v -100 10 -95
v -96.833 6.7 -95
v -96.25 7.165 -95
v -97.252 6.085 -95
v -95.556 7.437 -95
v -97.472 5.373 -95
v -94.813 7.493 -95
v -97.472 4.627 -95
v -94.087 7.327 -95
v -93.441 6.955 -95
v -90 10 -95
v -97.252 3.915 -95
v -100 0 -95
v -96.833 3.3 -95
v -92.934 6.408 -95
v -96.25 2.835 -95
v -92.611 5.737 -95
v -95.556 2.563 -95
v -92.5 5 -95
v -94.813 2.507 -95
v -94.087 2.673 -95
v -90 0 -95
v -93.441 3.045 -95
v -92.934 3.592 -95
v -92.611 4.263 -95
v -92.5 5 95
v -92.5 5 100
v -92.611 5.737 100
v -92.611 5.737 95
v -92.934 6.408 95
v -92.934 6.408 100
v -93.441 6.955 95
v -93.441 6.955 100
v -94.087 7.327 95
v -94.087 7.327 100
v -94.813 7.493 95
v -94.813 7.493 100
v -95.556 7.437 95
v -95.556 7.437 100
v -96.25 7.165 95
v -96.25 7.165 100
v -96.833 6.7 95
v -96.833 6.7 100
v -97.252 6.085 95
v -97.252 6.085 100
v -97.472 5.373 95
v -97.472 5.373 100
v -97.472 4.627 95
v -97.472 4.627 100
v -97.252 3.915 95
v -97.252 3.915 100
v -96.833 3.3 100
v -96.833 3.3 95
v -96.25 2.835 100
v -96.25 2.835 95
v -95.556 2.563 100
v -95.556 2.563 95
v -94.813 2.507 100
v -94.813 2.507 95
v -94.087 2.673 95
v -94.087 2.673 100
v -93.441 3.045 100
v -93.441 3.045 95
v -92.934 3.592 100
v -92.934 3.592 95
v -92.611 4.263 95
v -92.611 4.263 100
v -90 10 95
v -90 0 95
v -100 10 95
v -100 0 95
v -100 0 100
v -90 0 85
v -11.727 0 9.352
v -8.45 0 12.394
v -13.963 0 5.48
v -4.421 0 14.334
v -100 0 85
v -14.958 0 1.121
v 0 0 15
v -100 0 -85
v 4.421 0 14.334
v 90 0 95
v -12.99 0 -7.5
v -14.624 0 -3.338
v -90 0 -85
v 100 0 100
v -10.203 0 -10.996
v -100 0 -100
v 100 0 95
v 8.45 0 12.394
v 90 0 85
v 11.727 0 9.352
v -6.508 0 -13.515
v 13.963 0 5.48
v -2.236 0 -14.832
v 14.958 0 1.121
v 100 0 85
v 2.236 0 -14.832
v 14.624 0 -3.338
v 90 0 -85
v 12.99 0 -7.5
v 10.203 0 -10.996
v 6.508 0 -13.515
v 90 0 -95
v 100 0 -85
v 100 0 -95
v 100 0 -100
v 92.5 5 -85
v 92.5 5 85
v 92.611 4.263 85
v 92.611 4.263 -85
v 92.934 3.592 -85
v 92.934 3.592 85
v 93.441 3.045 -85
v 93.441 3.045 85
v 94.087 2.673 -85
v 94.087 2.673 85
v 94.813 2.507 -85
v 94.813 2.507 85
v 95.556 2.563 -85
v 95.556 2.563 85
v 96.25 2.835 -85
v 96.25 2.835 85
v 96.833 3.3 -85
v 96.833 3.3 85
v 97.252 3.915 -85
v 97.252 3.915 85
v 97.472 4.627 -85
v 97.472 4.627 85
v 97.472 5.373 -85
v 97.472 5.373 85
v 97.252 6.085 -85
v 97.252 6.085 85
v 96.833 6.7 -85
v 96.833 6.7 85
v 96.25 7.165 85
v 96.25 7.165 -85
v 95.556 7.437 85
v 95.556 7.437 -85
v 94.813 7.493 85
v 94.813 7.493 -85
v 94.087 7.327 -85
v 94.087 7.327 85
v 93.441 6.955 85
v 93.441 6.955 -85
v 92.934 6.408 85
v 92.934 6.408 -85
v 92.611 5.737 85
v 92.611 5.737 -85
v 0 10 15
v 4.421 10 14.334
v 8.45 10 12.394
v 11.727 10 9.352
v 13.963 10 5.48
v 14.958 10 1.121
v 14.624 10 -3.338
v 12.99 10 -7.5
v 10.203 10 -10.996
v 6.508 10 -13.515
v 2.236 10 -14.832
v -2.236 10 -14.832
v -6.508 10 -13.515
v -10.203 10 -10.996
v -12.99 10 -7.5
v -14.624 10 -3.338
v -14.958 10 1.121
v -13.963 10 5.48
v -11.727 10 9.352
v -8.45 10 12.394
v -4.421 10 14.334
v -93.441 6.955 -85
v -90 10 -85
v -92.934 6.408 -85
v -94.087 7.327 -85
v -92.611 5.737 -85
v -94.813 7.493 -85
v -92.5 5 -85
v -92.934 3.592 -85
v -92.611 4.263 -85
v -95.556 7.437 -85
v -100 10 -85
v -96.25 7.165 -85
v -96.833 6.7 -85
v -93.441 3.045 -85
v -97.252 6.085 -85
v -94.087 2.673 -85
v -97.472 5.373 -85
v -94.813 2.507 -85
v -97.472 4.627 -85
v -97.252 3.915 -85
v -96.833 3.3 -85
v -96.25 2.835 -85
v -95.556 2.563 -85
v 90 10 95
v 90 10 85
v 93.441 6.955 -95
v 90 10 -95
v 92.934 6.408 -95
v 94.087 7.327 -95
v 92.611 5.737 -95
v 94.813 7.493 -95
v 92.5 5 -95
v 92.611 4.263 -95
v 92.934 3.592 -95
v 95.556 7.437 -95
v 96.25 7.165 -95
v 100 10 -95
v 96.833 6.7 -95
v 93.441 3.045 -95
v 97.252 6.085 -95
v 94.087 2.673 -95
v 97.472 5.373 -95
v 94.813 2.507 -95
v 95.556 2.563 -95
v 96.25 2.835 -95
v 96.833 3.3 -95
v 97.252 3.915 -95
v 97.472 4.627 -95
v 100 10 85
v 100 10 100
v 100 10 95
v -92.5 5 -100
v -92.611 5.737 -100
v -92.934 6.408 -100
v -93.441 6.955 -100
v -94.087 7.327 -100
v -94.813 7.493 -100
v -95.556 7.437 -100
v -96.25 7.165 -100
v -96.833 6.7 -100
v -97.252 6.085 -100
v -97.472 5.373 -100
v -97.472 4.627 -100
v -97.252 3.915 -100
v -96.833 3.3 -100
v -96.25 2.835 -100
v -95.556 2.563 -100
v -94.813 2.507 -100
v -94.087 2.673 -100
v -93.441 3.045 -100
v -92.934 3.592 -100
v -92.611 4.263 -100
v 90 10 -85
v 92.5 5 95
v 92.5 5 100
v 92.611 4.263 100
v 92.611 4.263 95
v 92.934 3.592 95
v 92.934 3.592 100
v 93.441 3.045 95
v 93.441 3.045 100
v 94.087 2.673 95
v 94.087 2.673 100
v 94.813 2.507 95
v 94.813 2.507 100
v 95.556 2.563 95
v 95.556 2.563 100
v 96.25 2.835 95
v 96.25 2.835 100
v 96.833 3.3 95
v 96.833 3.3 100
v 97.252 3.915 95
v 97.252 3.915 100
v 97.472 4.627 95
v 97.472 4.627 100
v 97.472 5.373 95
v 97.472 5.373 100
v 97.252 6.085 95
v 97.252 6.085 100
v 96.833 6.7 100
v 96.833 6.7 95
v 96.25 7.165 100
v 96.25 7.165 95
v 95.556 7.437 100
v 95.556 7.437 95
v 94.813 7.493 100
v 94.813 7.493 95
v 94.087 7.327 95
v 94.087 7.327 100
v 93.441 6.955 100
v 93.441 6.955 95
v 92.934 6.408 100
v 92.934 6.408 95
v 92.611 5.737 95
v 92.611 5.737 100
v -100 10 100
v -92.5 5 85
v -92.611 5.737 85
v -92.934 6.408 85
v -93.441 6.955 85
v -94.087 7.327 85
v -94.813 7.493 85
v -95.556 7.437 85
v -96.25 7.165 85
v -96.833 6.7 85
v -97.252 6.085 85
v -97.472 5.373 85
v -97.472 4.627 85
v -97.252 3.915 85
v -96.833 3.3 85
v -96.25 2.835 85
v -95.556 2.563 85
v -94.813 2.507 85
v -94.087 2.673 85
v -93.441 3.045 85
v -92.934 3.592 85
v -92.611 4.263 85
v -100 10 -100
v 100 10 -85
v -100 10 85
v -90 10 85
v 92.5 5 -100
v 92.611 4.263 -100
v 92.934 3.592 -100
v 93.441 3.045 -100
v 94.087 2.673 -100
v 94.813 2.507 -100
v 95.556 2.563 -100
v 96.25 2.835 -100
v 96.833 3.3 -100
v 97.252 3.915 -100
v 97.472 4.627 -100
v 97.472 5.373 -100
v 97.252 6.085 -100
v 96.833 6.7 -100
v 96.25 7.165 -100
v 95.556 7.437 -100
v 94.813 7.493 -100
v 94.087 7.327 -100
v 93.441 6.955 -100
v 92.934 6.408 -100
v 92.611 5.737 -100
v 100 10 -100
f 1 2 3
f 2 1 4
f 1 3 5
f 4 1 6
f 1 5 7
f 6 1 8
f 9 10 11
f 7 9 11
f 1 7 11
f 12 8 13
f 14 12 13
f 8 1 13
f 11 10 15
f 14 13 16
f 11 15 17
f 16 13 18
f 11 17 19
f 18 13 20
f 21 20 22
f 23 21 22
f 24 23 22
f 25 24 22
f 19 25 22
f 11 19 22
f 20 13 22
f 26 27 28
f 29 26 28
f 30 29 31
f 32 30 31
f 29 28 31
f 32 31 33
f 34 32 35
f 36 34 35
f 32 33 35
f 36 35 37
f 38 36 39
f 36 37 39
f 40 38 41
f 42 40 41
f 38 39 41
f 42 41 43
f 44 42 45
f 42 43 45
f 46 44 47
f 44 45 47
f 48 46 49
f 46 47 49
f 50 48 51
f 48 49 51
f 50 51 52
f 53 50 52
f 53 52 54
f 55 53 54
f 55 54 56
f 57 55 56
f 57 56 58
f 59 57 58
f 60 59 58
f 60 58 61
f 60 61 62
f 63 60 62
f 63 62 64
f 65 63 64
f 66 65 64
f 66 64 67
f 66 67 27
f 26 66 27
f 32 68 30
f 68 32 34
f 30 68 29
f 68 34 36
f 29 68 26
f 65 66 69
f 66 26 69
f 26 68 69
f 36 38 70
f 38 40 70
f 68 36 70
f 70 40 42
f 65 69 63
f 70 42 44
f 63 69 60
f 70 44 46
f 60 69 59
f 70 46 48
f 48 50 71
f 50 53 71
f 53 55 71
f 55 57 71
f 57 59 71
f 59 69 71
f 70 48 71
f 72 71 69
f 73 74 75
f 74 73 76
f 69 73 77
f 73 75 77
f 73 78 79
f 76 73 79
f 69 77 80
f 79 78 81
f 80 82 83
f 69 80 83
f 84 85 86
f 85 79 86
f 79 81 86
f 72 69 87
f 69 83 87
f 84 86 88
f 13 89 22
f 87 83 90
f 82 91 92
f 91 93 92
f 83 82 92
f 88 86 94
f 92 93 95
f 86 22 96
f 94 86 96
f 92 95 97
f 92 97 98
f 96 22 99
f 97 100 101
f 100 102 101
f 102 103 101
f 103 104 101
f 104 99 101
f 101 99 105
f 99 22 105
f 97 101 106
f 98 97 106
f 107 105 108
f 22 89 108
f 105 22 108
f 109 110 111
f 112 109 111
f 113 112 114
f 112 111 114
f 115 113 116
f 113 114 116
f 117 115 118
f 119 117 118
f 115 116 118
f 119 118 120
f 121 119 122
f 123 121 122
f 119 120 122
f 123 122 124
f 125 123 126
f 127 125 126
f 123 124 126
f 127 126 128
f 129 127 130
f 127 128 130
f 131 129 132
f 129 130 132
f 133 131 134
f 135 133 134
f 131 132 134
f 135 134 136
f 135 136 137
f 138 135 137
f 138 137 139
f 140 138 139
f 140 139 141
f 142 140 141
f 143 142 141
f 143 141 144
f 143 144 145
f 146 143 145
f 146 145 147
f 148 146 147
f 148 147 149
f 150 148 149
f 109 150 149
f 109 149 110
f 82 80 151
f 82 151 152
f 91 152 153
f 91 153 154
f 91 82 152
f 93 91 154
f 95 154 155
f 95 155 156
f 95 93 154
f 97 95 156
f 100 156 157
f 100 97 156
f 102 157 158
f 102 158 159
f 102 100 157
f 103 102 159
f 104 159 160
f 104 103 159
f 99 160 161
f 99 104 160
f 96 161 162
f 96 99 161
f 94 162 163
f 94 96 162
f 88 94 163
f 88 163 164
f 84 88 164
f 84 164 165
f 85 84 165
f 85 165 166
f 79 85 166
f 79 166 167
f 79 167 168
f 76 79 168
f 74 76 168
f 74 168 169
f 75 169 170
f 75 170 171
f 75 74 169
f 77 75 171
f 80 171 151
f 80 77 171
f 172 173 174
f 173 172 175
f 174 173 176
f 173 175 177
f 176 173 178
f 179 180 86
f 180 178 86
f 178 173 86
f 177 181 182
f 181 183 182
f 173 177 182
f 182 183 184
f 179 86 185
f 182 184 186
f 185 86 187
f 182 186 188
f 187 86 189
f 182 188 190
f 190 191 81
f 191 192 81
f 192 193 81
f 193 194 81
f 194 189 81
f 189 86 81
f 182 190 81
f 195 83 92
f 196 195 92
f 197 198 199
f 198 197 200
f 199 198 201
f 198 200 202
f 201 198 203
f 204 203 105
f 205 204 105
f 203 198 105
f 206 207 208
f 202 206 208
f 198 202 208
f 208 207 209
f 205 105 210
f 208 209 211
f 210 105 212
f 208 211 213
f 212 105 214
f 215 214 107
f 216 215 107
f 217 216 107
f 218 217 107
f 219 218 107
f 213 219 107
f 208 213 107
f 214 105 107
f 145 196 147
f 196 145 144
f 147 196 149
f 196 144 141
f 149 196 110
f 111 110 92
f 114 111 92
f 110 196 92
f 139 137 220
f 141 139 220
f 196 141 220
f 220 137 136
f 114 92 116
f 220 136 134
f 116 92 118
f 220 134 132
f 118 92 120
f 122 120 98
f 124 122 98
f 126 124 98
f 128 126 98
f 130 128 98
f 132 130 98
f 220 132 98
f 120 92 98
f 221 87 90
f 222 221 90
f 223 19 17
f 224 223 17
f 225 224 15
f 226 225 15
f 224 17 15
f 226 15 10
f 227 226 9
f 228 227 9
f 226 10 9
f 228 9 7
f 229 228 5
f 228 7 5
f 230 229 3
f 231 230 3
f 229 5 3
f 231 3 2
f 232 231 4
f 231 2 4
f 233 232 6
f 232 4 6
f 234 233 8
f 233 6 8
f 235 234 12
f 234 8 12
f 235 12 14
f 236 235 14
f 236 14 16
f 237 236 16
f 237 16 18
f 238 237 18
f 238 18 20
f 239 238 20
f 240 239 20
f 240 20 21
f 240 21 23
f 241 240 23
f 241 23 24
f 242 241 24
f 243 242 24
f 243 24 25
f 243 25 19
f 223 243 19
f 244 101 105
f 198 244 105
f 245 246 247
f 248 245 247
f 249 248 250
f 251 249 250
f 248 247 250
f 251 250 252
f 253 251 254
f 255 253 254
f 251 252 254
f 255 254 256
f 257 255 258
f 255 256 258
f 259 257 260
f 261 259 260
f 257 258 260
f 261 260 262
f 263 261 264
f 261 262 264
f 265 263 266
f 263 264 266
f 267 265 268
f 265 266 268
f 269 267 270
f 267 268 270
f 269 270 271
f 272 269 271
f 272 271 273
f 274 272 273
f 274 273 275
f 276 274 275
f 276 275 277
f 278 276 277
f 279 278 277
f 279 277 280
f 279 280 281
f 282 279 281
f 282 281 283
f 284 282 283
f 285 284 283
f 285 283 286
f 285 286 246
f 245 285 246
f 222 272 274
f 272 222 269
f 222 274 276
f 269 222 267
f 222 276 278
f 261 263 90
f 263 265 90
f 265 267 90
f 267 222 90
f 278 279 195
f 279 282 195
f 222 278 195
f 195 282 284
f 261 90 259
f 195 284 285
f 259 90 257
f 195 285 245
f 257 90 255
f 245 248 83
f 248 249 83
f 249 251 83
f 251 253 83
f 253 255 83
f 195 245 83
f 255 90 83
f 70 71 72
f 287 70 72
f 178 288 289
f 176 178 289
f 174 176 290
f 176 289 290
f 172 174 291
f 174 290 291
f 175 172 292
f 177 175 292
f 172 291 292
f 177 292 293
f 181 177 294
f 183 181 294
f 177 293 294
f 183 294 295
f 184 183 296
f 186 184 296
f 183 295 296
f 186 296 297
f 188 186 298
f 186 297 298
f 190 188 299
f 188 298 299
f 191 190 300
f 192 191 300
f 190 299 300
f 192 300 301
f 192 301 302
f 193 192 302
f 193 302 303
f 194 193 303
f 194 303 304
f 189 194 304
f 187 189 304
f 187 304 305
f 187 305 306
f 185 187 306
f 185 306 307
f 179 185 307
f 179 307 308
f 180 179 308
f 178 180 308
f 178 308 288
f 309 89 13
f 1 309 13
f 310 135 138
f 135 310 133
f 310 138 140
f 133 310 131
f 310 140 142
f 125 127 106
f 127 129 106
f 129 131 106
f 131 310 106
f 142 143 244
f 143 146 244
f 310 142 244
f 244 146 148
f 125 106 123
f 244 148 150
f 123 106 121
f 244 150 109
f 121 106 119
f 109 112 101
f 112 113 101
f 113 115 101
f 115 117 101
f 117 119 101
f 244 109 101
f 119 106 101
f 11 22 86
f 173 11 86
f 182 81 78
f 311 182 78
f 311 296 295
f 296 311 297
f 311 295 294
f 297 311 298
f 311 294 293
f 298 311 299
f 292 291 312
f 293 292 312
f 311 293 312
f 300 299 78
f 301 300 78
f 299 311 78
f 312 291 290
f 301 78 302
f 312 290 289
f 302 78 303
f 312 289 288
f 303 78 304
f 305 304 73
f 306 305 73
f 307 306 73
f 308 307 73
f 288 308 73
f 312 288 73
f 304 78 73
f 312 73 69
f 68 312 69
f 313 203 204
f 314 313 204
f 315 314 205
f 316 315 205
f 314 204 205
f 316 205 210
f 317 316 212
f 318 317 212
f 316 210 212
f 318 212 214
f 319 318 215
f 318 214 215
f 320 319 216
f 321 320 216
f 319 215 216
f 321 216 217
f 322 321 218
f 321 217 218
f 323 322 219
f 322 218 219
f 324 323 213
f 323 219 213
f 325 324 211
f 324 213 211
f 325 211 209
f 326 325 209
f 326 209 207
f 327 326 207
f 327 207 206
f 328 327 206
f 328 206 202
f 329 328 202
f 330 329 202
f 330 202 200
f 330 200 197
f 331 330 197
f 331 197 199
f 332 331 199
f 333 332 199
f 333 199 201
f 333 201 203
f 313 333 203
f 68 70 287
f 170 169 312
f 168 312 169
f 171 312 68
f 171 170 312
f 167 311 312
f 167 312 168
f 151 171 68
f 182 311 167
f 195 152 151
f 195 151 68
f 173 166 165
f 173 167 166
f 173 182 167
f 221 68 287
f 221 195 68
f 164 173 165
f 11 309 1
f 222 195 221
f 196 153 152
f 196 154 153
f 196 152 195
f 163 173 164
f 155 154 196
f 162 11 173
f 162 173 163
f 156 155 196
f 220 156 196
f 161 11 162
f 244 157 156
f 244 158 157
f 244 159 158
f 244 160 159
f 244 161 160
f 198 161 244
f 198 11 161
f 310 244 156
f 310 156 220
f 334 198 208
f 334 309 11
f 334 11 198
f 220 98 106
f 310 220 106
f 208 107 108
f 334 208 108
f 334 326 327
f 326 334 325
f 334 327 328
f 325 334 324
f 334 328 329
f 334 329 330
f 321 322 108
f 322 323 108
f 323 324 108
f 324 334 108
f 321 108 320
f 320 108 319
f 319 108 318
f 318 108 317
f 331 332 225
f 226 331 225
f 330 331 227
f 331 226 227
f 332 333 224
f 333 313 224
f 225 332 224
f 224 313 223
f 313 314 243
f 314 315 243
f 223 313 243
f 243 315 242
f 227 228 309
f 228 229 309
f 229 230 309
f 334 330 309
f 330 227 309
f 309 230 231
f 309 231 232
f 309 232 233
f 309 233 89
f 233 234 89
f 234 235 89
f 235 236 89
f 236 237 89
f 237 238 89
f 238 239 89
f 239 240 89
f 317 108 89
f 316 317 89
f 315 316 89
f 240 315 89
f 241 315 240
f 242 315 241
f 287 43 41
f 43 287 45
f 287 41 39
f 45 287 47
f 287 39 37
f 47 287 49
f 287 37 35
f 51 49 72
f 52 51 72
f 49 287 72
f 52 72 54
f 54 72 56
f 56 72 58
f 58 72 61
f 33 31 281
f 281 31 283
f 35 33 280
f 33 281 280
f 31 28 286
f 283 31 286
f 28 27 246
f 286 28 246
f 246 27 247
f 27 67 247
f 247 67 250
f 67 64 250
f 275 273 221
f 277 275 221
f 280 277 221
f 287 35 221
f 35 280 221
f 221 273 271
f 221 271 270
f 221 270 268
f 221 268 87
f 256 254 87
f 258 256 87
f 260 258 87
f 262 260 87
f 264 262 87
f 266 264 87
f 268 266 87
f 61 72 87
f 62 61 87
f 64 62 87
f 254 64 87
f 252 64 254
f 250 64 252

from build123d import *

# Parameters (mm, degrees)
ESQUISSE1_R             = 15
BASE_DEPTH              = 10
ESQUISSE2_R             = 2.5
ENL_V_MAT_EXTRU_1_DEPTH = 224.830292856


with BuildPart() as part:
    # Esquisse1 → BASE (new body)
    with BuildSketch(Plane(origin=(0, 0, 0), x_dir=(1, 0, 0), z_dir=(0, 1, 0))):
        Polygon((-100, 95), (-90, 95), (-90, 85), (-100, 85), (-100, -85), (-90, -85), (-90, -95), (-100, -95), (-100, -100), (-15, -100), (15, -100), (100, -100), (100, -95), (90, -95), (90, -85), (100, -85), (100, 85), (90, 85), (90, 95), (100, 95), (100, 100), (-100, 100), align=None)
        with Locations(Location((0, 0, 0), (0, 0, 270))):
            Circle(ESQUISSE1_R, mode=Mode.SUBTRACT)
    extrude(amount=BASE_DEPTH)

    # Esquisse2 → Enlèv. mat.-Extru.1 (cut, through all)
    with BuildSketch(Plane.XY.offset(100)):
        with Locations((-95, 5)):
            Circle(ESQUISSE2_R)
        with Locations(Location((95, 5, 0), (0, 0, 180))):
            Circle(ESQUISSE2_R)
    extrude(amount=-ENL_V_MAT_EXTRU_1_DEPTH, mode=Mode.SUBTRACT)


solid = part.part
